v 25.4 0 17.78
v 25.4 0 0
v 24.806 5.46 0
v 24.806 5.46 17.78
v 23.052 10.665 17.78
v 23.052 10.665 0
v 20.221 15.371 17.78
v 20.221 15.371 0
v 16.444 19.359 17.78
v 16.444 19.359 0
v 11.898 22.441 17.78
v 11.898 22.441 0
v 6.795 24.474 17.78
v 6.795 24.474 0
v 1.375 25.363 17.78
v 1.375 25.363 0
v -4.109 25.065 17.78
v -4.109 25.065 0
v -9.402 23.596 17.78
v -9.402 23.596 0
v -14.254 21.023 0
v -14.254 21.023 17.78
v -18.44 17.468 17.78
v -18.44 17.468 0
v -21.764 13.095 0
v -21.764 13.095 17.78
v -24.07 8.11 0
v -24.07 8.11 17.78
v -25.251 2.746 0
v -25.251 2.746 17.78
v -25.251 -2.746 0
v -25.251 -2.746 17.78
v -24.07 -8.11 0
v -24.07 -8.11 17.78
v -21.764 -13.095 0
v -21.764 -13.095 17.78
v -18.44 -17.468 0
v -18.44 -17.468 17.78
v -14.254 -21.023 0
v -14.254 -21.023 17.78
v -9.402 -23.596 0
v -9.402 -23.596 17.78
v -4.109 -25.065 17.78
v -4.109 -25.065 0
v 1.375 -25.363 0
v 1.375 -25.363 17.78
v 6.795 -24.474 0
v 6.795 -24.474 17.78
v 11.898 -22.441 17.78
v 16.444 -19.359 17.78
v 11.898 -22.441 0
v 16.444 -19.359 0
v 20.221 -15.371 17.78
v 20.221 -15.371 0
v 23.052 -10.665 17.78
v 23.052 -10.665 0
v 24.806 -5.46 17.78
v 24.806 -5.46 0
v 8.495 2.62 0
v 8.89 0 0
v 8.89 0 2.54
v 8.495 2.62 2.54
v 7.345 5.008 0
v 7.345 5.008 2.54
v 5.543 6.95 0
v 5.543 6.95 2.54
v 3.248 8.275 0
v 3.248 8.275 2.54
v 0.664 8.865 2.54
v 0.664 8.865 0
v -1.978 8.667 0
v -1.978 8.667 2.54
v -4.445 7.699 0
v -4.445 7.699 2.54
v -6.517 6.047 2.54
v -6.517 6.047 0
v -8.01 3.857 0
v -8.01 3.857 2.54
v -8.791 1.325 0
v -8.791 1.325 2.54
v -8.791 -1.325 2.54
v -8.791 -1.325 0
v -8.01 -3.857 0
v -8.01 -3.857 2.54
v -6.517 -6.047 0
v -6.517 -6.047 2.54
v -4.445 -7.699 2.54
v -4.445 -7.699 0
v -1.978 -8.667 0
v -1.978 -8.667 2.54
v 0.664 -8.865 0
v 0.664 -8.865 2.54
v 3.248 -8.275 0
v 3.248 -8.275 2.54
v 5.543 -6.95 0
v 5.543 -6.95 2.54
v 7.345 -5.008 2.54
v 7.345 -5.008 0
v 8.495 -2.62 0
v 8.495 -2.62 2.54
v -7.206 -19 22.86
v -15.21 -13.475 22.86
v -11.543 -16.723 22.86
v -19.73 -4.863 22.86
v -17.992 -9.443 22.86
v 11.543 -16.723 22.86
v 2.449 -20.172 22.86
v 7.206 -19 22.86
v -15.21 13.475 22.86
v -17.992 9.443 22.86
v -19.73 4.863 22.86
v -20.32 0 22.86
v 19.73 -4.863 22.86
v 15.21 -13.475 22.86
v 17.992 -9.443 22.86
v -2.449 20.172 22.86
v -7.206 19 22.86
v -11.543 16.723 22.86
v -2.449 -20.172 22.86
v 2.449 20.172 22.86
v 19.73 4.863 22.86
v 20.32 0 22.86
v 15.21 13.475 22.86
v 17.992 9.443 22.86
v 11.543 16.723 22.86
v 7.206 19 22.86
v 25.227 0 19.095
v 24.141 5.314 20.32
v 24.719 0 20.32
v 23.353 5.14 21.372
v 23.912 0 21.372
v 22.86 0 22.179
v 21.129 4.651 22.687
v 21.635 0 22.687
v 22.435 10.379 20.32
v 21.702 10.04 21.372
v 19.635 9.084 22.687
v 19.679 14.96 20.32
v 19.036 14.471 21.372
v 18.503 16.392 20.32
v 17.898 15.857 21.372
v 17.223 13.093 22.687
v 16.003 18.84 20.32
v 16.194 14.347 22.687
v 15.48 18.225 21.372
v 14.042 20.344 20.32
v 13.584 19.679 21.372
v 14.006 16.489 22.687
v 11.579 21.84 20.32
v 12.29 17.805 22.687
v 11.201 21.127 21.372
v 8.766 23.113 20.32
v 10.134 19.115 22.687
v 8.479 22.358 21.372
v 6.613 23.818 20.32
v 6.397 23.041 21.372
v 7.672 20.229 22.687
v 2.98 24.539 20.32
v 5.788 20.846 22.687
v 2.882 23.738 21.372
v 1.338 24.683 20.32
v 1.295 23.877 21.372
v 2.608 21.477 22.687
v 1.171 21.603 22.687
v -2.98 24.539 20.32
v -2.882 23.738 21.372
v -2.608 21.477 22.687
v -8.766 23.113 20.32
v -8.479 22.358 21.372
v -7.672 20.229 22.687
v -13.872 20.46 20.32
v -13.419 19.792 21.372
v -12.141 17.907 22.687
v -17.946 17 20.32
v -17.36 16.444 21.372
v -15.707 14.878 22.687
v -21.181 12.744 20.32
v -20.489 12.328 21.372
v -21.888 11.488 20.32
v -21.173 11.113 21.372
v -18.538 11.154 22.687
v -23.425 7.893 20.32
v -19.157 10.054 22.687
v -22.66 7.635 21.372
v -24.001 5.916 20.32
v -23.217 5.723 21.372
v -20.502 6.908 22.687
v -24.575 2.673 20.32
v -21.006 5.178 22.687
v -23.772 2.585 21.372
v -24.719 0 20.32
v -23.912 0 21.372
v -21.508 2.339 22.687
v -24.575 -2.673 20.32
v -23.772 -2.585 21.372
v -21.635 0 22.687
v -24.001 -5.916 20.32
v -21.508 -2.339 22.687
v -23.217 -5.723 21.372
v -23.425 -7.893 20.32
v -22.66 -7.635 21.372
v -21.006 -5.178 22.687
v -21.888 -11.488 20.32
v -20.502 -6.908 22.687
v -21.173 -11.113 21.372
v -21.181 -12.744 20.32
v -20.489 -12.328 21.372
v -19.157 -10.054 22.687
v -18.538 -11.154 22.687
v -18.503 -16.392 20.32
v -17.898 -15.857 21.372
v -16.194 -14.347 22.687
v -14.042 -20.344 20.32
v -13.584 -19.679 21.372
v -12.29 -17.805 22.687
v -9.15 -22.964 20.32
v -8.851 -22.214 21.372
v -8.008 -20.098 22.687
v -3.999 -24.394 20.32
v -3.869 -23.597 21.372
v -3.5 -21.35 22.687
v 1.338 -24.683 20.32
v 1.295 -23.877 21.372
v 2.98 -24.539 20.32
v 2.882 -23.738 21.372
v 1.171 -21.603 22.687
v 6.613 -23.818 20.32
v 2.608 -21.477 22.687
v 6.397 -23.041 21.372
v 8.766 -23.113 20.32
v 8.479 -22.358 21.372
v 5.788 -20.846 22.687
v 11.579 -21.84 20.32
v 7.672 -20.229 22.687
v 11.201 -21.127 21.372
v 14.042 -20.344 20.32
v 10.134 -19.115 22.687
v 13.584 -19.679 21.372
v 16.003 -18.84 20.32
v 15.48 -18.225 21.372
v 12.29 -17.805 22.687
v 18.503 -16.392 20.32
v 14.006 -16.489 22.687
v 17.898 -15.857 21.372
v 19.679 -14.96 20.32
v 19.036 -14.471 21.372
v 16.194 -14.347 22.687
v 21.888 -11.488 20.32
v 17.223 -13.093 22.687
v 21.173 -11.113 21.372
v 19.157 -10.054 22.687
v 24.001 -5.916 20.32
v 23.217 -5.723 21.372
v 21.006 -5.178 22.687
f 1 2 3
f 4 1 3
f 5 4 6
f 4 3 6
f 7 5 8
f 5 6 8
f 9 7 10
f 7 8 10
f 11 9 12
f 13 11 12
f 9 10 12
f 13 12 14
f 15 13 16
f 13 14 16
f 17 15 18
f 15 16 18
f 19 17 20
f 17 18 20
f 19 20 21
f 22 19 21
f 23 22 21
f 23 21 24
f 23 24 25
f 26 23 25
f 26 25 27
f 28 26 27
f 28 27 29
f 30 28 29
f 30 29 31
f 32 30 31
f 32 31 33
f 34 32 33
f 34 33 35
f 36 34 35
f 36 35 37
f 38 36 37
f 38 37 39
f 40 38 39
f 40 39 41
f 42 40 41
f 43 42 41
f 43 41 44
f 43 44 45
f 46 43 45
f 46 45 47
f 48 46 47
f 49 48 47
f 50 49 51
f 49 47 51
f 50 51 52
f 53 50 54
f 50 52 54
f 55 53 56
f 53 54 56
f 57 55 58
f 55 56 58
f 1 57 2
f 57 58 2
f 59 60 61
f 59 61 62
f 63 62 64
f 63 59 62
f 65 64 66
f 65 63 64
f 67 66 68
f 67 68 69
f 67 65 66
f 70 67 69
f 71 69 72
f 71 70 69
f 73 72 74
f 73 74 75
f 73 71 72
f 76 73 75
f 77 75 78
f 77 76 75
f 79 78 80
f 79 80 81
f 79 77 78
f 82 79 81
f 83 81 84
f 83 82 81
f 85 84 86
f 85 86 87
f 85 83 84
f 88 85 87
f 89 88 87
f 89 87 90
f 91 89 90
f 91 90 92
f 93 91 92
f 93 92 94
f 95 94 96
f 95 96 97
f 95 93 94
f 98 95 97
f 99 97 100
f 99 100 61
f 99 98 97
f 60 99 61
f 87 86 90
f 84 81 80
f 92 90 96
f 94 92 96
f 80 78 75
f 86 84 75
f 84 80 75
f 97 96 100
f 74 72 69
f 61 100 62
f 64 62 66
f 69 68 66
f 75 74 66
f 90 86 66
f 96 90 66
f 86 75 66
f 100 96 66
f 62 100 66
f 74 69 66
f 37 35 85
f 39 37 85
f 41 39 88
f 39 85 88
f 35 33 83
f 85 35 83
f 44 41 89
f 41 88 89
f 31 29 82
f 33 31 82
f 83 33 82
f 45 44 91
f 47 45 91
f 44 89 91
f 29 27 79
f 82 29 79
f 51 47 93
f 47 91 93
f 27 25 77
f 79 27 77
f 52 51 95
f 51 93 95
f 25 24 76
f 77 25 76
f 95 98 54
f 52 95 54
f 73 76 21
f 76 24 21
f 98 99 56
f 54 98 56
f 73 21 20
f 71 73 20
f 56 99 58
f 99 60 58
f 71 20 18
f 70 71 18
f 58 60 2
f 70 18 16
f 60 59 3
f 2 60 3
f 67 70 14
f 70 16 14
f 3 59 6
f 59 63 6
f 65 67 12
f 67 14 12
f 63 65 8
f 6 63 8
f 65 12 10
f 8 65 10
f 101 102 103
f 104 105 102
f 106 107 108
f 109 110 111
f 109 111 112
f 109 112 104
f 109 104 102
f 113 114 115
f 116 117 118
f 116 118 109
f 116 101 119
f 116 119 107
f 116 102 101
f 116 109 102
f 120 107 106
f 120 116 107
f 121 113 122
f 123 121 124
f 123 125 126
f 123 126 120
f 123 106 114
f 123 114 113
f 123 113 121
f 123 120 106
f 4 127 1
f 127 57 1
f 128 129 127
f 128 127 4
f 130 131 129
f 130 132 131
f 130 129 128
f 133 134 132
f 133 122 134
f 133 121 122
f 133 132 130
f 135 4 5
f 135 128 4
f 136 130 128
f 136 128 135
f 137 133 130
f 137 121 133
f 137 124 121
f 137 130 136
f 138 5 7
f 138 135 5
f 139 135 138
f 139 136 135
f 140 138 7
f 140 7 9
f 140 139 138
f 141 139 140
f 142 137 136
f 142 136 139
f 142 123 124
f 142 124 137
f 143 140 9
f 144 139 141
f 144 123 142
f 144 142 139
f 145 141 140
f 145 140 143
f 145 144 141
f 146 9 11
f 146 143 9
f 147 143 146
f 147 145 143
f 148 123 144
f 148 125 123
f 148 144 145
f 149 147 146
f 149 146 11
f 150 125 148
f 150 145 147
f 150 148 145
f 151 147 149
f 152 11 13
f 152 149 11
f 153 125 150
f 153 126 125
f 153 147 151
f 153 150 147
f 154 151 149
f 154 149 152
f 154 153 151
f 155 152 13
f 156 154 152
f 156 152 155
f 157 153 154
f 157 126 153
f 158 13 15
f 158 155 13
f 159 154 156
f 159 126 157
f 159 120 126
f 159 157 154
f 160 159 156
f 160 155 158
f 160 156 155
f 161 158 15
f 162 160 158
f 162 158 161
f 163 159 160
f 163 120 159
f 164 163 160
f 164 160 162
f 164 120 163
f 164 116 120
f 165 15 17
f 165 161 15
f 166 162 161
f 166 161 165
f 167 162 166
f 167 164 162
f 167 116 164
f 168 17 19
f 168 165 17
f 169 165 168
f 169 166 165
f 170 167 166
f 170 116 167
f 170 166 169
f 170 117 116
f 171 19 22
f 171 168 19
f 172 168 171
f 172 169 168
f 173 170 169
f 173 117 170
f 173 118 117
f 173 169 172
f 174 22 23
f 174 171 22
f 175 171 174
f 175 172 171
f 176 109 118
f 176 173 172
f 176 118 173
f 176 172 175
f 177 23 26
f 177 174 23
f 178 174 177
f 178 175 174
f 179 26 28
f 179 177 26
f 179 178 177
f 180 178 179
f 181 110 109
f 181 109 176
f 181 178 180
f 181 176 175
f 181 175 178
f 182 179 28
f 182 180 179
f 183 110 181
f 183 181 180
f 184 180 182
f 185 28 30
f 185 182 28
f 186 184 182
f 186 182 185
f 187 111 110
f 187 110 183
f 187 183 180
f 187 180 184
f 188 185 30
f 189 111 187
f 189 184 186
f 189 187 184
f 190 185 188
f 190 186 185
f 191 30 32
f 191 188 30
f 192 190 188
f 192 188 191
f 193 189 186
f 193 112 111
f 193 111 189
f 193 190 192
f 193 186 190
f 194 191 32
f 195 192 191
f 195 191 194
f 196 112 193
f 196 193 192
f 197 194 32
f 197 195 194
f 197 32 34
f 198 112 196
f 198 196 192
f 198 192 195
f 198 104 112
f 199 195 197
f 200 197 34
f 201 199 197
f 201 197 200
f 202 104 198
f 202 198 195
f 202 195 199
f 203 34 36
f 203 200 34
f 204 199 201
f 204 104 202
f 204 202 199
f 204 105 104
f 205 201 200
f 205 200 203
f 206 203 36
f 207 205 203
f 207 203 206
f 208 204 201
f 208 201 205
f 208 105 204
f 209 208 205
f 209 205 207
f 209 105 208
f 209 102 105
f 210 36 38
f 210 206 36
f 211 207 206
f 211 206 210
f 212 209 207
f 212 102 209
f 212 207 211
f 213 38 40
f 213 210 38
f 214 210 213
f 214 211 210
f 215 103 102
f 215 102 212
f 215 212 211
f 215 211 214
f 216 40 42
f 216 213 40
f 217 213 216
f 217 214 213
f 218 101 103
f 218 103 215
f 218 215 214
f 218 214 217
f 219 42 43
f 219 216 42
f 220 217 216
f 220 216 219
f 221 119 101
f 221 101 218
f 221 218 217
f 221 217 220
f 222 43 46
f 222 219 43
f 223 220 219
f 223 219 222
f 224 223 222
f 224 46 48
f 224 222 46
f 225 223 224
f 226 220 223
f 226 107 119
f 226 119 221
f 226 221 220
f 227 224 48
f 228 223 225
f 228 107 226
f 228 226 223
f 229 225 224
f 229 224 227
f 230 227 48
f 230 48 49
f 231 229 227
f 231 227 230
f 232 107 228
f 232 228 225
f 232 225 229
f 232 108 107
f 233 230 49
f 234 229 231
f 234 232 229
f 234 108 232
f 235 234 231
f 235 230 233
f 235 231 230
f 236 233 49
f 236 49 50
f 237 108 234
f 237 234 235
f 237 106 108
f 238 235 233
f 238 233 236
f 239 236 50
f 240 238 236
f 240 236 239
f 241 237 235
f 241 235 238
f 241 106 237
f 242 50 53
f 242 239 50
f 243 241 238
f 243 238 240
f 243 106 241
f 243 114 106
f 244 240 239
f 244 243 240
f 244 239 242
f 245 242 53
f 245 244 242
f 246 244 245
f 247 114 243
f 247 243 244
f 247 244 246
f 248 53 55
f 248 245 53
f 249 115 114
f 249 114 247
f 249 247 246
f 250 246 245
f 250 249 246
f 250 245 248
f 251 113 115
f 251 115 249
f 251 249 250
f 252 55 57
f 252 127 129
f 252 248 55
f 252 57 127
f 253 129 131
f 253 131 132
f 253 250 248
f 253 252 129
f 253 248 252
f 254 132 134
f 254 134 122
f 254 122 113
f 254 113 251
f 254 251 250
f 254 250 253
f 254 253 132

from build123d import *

# Parameters (mm, degrees)
F0_R     = 25.4
F0_R_2   = 8.89
F1_DEPTH = 2.54
F2_R     = 25.4
F2_R_2   = 8.89
F3_DEPTH = 20.32
F4_R     = 5.08


with BuildPart() as f1:
    # F0 (on Top) → F1 (new body)
    with BuildSketch(Plane.XY):
        Circle(F0_R)
        Circle(F0_R_2, mode=Mode.SUBTRACT)
    extrude(amount=F1_DEPTH)

    # F2 (on face) → F3 (join)
    with BuildSketch(Plane.XY.offset(2.54)):
        Circle(F2_R)
        Circle(F2_R_2, mode=Mode.SUBTRACT)
        Circle(F2_R_2)
    extrude(amount=F3_DEPTH)

    # F4
    f4_edges = [f1.edges().sort_by_distance(p)[0] for p in [
        (-25.4, 0, 22.86),
    ]]
    fillet(f4_edges, radius=F4_R)


solid = f1.part
